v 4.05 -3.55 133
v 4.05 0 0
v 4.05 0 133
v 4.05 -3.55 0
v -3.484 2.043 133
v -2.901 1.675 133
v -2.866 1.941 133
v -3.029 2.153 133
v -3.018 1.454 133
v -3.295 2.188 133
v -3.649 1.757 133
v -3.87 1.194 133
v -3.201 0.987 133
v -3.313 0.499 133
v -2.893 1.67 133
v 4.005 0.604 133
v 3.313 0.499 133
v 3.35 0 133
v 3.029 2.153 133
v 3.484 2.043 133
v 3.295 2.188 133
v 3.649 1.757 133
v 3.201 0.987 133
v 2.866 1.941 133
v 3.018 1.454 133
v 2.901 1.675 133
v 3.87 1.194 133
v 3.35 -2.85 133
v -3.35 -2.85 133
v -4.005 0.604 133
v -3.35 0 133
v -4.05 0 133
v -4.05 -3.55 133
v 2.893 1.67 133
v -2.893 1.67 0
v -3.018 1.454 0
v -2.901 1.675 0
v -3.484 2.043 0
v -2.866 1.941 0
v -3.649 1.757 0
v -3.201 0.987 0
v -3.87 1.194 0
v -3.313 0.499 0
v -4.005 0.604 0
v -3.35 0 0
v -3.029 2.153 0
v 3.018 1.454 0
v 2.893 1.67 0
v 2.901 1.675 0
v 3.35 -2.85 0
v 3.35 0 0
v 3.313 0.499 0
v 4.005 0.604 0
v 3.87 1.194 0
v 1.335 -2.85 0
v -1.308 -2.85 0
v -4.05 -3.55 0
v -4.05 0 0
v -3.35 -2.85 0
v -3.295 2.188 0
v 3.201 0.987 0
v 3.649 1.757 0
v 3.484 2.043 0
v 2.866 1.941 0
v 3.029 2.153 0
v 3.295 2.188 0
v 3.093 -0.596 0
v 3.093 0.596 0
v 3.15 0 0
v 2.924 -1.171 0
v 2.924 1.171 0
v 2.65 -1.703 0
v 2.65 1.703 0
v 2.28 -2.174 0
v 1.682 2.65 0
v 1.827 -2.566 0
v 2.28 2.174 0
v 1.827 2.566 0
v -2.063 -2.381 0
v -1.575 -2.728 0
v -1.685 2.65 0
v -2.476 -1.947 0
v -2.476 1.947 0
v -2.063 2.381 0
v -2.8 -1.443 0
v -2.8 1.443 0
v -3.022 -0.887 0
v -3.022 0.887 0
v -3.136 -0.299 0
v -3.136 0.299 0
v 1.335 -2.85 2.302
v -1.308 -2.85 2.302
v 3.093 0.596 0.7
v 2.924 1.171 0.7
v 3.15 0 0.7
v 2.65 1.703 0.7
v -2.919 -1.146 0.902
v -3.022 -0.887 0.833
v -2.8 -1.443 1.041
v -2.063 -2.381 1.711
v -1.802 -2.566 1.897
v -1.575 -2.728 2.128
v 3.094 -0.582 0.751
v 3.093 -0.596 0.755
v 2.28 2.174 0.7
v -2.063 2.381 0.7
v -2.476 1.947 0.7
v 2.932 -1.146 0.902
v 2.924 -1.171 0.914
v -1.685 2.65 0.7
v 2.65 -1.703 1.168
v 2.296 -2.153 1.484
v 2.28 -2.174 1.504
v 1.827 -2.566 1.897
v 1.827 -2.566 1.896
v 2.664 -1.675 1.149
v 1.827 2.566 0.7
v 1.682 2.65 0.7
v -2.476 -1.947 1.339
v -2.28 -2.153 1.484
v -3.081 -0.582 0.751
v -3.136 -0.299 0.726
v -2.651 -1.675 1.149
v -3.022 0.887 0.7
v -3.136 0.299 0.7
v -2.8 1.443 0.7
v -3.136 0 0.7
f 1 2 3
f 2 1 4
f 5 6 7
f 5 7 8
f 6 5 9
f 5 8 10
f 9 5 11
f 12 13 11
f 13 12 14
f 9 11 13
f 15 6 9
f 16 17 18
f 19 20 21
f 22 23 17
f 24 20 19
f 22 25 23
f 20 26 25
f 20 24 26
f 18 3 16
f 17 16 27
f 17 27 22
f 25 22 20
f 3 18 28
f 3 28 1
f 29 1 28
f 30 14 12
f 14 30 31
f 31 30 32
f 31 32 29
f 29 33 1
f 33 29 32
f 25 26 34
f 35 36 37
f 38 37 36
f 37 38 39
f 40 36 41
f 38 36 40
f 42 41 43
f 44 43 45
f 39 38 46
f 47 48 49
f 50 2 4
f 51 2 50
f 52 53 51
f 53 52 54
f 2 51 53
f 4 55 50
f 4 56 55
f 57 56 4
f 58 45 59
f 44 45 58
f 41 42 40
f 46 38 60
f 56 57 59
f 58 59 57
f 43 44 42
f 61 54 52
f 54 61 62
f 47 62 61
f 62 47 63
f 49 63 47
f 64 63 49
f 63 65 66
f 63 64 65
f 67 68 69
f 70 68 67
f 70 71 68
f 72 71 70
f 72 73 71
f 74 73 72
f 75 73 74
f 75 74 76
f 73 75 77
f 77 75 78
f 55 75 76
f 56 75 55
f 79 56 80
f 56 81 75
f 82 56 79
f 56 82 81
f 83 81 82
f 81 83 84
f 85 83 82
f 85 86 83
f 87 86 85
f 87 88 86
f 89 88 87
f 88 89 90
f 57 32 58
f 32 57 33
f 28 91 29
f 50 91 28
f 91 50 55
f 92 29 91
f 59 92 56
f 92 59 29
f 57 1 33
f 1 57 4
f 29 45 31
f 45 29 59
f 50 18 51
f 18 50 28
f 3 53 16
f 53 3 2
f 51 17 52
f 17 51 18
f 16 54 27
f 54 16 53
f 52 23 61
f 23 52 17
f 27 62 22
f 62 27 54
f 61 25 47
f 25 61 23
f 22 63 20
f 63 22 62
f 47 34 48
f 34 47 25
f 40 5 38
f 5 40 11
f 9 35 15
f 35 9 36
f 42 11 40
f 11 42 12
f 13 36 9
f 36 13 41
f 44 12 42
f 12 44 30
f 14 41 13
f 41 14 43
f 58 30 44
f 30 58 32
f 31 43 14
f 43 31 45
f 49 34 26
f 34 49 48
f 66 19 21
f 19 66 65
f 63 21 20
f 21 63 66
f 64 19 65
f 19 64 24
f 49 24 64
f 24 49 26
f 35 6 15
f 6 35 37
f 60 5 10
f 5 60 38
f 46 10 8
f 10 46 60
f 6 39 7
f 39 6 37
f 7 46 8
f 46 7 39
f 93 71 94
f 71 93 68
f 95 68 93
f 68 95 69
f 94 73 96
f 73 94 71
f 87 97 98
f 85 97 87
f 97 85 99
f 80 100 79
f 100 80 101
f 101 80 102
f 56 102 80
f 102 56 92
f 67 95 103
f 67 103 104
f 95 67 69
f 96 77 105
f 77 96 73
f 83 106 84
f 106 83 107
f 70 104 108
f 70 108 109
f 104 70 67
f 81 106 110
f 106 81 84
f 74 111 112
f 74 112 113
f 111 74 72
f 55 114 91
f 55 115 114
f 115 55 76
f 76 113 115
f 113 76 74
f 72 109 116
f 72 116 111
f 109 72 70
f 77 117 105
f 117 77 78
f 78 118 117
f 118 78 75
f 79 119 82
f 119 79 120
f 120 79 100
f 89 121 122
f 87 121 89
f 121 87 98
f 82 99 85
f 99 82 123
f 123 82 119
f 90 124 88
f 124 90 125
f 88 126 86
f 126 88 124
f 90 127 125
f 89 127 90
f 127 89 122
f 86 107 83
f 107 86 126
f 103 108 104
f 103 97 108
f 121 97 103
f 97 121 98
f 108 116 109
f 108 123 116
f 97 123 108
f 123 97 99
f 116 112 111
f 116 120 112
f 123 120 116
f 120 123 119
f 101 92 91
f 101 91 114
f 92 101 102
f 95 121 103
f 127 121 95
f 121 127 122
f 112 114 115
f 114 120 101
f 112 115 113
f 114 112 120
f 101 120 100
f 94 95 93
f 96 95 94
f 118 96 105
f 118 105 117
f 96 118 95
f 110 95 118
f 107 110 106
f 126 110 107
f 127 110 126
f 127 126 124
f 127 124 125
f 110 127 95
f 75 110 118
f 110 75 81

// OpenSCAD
Pen_Diameter = 6.7; // 0.1
pen_radius = Pen_Diameter / 2;
Pen_Thickness = 5.7; // 0.1
Pen_Length = 133; // 0.1
Pen_Tip_Length = 6; // 0.1
Holder_Thickness = 0.7; // 0.1
Holder_Grasp_Angle = 30; // [0:0.1:45]

$fa = $preview ? 15 : 2;
$fs = $preview ? 1.25 : 0.6;

module holder_2_body() {
	// Back
	translate([0, -Holder_Thickness, 0])
		cube([Pen_Diameter+Holder_Thickness*2, Holder_Thickness, Pen_Length]);

	// Left
	cube([Holder_Thickness, Pen_Thickness/2, Pen_Length]);

	// Right
	translate([Pen_Diameter+Holder_Thickness, 0, 0])
		cube([Holder_Thickness, Pen_Thickness/2, Pen_Length]);

	// Arc
	translate([pen_radius+Holder_Thickness, Pen_Thickness/2, 0])
		rotate_extrude(angle=180, convexity=5)
			translate([pen_radius, 0, 0])
				square([Holder_Thickness, Pen_Length]);
}

module holder_2_back() {
	t = 0.2;
	translate([Holder_Thickness+t, 0, 0]) {
		difference() {
			// Plate
			translate([pen_radius-t, Pen_Thickness/2, 0])
				cylinder(r=pen_radius-t, h=Holder_Thickness+pen_radius);
			// Quarter pipe
			translate([pen_radius-t, Pen_Thickness/2, Holder_Thickness+pen_radius])
				rotate(90, [0,1,0])
					cylinder(r=pen_radius, h=Pen_Diameter-t*2, center=true);
			// Flat face
			translate([0, Pen_Thickness/2, Holder_Thickness])
				cube([Pen_Diameter, Pen_Thickness, Holder_Thickness+pen_radius]);
			// Flat top
			translate([0, Pen_Thickness-t, 0])
				cube([Pen_Diameter, Pen_Thickness, Holder_Thickness]);
		}
	}
}

//holder_2_body();
//holder_2_back();
difference() {
	translate([-pen_radius-Holder_Thickness, -Pen_Thickness/2, 0])
		holder_2_body();
	holder_negative();
}
translate([-pen_radius-Holder_Thickness, -Pen_Thickness/2, 0])
	holder_2_back();
/*
*/

module pen() {
	intersection() {
		translate([0, 0, pen_radius])
			union() {
				translate([0, 0, Pen_Length-Pen_Tip_Length-pen_radius])
					cylinder(d1=Pen_Diameter, d2=0, h=Pen_Tip_Length);
				cylinder(d=Pen_Diameter, h=Pen_Length-Pen_Tip_Length-pen_radius);
				sphere(r=pen_radius);
			}
		translate([-pen_radius, -Pen_Thickness/2, 0])
			cube([Pen_Diameter, Pen_Thickness, Pen_Length]);
	}
}

module holder_body() {
	radius = pen_radius + Holder_Thickness;
	length = Pen_Length-2;
	thickness = Pen_Thickness + Holder_Thickness*2;
	intersection() {
		cylinder(r=radius, h=Pen_Length);
		translate([-radius, -thickness/2, 0])
			cube([radius*2, thickness, Pen_Length]);
	}
	translate([-radius, -thickness/2, 0])
		cube([radius*2, thickness/2, Pen_Length]);
}

module holder_negative() {
	radius = pen_radius + Holder_Thickness;
	// Right side
	rotate(Holder_Grasp_Angle, [0,0,1])
		difference() {
			cube([Pen_Diameter, Pen_Diameter, Pen_Length]);
			translate([radius-Holder_Thickness/2, 0, 0])
				cylinder(d=Holder_Thickness, h=Pen_Length, $fa=$fa/2, $fs=$fs/2);
		}
	// Left side
	rotate(90-Holder_Grasp_Angle, [0,0,1])
		difference() {
			cube([Pen_Diameter, Pen_Diameter, Pen_Length]);
			translate([0, radius-Holder_Thickness/2, 0])
				cylinder(d=Holder_Thickness, h=Pen_Length, $fa=$fa/2, $fs=$fs/2);
		}
}

/*
pen();
rotate(90, [1,0,0])
translate([0, Pen_Thickness/2+Holder_Thickness, -Pen_Length/2])
difference() {
	holder_body();
	holder_negative();
	color("Azure")
	pen();
}
*/
